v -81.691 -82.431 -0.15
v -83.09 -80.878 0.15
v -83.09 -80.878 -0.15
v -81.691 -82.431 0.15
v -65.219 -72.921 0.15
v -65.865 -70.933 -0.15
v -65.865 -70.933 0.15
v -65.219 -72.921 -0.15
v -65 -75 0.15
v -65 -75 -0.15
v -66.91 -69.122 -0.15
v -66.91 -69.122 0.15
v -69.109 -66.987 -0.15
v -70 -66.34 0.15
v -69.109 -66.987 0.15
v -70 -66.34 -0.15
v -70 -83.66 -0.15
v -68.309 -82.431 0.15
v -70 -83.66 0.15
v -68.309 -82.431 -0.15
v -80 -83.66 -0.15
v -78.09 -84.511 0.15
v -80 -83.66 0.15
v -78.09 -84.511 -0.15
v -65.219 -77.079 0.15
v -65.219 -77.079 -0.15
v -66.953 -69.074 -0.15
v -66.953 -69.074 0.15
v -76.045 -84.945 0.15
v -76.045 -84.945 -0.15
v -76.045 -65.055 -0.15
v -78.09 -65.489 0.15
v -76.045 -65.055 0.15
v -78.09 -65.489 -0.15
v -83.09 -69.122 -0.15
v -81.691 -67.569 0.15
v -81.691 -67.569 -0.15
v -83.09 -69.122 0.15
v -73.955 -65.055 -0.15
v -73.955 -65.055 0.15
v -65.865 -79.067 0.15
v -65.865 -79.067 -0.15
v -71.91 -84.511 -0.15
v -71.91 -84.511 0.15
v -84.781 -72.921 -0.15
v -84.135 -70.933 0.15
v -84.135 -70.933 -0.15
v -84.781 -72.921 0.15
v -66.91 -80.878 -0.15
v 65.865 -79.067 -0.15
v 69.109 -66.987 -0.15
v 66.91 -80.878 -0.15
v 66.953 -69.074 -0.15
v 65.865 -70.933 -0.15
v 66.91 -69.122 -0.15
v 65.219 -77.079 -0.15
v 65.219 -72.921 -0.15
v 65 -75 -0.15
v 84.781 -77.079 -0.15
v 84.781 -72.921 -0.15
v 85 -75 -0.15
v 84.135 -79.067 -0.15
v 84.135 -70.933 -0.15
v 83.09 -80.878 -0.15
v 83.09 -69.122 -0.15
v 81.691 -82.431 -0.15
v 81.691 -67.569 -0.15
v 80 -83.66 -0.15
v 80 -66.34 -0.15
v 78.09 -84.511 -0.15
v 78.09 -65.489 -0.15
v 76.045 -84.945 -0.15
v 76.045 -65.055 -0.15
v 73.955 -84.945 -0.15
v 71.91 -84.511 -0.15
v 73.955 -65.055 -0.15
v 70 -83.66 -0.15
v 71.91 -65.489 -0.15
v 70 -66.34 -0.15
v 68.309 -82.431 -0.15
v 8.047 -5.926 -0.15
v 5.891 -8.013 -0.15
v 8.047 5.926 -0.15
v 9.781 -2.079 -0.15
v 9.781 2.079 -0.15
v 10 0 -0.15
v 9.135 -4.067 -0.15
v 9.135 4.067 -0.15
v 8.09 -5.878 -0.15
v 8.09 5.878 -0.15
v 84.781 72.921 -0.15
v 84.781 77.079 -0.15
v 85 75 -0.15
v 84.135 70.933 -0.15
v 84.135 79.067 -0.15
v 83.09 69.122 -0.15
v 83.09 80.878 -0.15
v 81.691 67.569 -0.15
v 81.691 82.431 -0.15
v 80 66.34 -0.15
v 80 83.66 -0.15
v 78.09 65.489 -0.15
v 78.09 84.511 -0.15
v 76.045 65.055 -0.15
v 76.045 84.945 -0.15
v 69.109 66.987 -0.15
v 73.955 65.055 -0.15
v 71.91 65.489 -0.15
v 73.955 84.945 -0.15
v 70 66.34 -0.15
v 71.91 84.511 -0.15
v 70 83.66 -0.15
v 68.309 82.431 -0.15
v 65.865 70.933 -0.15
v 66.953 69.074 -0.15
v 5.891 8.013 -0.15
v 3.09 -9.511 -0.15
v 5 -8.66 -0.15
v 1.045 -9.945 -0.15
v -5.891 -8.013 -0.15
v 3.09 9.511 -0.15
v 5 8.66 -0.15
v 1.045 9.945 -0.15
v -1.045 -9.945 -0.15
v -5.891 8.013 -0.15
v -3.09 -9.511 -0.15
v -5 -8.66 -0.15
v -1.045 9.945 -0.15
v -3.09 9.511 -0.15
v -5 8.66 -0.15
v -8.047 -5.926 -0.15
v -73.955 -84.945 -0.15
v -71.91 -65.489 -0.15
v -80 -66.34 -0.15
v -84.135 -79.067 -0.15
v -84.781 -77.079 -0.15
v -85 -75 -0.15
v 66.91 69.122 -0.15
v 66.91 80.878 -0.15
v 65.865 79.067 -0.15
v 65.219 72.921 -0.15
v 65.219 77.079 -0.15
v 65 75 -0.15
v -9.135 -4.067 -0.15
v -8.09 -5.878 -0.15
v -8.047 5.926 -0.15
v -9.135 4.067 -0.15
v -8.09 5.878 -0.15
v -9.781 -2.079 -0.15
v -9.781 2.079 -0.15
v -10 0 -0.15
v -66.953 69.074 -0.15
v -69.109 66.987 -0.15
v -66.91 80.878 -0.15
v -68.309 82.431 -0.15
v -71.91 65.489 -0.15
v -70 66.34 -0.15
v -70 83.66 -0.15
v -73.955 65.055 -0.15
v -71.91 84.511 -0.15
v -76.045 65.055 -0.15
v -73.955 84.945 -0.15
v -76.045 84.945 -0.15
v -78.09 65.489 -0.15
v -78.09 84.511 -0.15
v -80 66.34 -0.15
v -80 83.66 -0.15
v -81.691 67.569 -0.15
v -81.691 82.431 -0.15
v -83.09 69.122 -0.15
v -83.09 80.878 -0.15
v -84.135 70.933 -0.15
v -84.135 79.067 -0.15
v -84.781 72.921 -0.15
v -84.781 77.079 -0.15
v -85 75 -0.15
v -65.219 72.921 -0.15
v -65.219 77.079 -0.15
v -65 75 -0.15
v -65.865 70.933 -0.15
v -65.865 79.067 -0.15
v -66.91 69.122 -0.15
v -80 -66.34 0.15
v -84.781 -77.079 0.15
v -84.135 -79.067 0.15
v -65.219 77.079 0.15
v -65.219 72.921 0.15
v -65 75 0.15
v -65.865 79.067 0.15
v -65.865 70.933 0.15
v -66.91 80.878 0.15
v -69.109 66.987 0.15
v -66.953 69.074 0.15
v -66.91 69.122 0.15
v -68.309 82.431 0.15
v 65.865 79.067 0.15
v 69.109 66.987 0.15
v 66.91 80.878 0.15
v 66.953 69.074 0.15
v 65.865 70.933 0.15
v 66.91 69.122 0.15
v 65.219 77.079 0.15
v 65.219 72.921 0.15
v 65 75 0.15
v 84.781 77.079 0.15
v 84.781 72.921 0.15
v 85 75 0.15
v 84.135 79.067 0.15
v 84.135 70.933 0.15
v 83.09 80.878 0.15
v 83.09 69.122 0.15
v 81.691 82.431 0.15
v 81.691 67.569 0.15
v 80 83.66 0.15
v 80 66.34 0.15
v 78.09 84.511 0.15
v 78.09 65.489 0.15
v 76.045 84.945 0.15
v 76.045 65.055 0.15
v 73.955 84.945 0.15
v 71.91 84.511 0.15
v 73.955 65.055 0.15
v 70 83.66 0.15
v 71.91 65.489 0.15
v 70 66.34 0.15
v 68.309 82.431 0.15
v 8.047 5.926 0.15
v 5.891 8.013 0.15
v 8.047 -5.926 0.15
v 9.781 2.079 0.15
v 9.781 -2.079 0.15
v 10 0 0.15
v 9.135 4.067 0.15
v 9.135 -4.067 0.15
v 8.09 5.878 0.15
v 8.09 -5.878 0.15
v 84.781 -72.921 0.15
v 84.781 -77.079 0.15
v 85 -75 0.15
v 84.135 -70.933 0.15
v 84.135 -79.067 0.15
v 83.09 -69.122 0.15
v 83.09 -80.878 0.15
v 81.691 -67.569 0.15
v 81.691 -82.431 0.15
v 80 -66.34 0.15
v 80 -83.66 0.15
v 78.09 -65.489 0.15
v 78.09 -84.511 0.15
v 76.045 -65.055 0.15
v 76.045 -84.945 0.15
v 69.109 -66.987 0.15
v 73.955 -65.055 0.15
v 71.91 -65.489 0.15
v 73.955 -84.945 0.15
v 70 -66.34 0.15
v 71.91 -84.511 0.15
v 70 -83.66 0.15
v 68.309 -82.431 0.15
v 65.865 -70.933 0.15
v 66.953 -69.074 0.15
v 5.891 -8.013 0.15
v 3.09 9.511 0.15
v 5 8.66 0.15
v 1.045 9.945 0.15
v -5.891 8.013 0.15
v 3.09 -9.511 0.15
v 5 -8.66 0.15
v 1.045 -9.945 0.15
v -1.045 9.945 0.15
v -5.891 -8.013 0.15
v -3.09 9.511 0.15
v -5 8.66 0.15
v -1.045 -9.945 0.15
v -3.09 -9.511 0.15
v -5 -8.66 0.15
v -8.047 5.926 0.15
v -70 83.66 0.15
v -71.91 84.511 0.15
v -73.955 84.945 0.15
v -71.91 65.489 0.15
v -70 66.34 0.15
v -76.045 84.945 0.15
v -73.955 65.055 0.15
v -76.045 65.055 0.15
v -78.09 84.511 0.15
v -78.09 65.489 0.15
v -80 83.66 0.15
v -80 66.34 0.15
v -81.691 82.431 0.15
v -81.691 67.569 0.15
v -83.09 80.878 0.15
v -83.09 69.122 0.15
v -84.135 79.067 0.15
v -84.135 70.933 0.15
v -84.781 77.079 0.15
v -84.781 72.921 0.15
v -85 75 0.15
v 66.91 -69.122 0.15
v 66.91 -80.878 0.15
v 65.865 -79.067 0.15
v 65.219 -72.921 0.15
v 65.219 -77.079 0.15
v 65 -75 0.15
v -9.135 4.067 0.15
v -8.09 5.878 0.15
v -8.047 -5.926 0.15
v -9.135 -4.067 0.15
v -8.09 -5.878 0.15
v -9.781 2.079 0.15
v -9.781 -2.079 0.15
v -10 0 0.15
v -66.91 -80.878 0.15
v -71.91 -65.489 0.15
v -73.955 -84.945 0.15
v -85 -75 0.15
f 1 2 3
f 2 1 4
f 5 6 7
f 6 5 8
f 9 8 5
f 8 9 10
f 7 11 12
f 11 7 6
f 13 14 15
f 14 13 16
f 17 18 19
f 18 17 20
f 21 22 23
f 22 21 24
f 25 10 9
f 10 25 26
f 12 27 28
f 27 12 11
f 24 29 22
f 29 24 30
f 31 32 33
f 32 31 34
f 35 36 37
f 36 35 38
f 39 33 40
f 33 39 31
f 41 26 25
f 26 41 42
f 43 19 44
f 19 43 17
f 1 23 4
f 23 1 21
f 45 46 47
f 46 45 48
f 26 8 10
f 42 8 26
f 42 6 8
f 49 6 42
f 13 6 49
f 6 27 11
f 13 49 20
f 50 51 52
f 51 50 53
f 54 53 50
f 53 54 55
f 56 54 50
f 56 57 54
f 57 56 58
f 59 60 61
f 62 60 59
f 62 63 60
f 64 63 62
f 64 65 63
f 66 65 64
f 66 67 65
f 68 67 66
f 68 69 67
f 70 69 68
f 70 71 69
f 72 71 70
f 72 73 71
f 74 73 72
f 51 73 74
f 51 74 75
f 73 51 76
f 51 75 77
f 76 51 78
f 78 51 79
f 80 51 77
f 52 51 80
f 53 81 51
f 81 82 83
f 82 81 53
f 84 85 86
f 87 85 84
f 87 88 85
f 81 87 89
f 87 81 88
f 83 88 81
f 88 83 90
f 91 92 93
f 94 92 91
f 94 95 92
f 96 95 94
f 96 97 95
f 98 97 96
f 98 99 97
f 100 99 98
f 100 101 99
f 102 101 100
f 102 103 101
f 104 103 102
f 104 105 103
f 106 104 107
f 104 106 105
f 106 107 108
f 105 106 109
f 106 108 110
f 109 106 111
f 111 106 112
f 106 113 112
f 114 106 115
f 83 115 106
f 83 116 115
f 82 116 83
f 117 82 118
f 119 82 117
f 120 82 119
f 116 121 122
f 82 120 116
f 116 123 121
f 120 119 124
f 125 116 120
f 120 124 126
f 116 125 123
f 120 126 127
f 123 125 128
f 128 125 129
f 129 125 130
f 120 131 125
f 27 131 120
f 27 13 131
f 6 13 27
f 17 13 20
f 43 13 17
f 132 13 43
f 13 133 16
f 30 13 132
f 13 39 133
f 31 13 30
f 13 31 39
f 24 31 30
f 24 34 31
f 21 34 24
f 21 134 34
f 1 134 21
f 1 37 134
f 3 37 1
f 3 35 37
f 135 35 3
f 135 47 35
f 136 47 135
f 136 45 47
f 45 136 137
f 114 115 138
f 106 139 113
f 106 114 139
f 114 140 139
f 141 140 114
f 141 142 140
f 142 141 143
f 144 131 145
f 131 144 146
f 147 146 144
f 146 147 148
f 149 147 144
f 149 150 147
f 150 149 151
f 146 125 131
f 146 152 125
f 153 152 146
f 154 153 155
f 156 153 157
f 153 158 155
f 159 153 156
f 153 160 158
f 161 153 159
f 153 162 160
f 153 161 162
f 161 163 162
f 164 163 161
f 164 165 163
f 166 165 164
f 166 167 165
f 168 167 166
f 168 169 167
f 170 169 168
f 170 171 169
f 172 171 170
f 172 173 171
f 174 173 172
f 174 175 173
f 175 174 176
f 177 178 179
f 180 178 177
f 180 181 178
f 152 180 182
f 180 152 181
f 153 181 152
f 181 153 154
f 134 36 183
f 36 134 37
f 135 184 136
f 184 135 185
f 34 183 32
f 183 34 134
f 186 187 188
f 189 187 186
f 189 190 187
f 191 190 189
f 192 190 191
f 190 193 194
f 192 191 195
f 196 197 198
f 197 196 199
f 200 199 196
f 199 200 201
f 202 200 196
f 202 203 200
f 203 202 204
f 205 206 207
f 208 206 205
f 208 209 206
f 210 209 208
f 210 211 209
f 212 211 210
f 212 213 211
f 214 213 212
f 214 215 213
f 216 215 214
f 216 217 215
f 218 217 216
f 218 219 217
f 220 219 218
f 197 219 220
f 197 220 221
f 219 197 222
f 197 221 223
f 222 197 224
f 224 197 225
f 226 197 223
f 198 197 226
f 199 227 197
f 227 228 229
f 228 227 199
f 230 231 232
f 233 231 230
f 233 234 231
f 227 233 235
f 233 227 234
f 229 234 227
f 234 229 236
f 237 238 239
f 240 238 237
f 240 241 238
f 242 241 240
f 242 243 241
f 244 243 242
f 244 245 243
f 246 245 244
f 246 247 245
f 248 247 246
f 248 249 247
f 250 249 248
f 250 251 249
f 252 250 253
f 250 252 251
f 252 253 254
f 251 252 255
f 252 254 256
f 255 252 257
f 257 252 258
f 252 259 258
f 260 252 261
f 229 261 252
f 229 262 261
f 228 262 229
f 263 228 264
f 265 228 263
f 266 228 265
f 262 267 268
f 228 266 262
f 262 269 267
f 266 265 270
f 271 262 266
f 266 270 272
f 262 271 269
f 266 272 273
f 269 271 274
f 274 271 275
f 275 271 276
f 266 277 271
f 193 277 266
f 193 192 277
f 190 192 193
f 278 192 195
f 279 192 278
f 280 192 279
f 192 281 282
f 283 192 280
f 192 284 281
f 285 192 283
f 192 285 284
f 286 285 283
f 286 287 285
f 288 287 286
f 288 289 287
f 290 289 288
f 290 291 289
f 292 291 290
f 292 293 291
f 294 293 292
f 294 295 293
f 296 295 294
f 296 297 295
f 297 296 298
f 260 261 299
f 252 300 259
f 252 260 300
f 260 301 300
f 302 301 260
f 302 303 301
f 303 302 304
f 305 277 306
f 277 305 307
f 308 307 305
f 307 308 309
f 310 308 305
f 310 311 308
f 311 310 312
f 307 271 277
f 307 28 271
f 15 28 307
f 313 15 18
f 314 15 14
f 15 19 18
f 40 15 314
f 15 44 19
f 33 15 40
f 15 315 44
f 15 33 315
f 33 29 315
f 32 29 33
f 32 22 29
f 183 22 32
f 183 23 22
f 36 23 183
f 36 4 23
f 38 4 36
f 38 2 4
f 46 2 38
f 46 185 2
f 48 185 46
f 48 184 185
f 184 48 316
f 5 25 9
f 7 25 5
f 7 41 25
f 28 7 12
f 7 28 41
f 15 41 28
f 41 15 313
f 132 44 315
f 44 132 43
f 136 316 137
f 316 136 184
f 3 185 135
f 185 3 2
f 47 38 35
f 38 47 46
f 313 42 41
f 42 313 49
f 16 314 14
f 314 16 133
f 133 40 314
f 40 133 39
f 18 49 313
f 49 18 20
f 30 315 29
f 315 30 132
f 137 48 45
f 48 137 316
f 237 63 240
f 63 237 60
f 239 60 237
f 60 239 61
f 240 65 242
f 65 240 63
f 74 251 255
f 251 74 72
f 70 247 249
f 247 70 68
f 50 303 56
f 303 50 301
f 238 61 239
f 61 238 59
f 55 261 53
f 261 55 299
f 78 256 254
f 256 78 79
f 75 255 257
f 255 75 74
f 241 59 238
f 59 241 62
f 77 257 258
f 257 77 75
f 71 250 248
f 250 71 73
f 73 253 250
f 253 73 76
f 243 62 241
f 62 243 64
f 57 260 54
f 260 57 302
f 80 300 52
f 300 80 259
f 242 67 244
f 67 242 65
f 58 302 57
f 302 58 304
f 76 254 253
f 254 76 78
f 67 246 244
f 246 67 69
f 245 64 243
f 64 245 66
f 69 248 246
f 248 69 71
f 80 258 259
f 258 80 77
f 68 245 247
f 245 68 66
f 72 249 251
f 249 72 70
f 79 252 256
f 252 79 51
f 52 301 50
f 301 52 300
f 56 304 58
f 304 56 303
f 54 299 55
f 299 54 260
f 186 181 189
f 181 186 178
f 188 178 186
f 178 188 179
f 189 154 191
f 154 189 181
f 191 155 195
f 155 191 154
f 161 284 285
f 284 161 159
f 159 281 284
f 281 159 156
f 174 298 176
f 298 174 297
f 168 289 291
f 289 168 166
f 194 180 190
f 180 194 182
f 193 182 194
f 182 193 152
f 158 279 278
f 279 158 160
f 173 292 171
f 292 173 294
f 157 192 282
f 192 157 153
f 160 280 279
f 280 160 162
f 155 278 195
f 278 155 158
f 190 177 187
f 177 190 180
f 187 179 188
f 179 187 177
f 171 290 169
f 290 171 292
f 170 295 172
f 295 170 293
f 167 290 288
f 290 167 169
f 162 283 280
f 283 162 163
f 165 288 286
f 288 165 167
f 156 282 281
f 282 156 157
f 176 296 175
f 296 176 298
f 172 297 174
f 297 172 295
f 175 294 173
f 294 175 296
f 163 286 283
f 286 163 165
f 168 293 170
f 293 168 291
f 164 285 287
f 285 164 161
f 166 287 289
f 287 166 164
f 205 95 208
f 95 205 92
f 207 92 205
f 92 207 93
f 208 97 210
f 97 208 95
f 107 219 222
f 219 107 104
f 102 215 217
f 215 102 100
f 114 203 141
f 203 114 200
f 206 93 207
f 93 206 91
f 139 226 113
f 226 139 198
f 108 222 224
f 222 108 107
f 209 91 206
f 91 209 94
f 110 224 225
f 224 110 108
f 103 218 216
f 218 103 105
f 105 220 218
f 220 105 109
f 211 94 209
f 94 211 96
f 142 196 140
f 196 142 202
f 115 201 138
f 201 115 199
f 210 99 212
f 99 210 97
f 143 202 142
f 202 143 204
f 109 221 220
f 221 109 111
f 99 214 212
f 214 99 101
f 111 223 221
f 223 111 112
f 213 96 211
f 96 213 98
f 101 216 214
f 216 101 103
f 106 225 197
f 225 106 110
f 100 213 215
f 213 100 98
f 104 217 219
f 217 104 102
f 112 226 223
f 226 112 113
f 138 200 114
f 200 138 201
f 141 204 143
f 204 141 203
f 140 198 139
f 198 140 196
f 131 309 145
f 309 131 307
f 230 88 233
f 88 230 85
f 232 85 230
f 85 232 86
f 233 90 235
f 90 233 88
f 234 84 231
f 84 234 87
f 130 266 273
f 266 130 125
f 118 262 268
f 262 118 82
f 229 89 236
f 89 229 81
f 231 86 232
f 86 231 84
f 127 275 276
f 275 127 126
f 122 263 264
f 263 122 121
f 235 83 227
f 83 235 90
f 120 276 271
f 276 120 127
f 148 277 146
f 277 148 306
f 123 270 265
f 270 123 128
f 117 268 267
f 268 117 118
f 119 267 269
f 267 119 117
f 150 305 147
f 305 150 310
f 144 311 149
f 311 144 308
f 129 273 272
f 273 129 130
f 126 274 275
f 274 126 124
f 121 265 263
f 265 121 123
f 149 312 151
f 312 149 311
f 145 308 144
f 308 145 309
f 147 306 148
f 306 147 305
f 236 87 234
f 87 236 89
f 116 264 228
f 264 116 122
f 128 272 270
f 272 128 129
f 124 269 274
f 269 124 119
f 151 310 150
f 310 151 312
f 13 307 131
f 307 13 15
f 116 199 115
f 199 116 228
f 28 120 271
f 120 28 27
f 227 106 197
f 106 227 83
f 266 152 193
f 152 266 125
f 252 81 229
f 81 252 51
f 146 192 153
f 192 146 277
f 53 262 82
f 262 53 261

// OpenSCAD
module PrusaPrintTest001()
{
    xpos= 75;
    ypos = 75;
    rsize = 10;
    
    union() {
translate([-xpos,-ypos,0]){
      cylinder(r=rsize, h=0.3, center = true);
}
translate([xpos,-ypos,0]){
      cylinder(r=rsize, h=0.3, center = true);
}
translate([-xpos,ypos,0]){
      cylinder(r=rsize, h=0.3, center = true);
}
translate([xpos,ypos,0]){
      cylinder(r=rsize, h=0.3, center = true);
}
cylinder(r=rsize, h=0.3, center = true);

rotate([0,0,45])
      cube([(xpos+ypos)*1.4, 3, 0.3], center = true);
rotate([0,0,-45])
      cube([(xpos+ypos)*1.4, 3, 0.3], center = true);

    }
    
}

PrusaPrintTest001();
